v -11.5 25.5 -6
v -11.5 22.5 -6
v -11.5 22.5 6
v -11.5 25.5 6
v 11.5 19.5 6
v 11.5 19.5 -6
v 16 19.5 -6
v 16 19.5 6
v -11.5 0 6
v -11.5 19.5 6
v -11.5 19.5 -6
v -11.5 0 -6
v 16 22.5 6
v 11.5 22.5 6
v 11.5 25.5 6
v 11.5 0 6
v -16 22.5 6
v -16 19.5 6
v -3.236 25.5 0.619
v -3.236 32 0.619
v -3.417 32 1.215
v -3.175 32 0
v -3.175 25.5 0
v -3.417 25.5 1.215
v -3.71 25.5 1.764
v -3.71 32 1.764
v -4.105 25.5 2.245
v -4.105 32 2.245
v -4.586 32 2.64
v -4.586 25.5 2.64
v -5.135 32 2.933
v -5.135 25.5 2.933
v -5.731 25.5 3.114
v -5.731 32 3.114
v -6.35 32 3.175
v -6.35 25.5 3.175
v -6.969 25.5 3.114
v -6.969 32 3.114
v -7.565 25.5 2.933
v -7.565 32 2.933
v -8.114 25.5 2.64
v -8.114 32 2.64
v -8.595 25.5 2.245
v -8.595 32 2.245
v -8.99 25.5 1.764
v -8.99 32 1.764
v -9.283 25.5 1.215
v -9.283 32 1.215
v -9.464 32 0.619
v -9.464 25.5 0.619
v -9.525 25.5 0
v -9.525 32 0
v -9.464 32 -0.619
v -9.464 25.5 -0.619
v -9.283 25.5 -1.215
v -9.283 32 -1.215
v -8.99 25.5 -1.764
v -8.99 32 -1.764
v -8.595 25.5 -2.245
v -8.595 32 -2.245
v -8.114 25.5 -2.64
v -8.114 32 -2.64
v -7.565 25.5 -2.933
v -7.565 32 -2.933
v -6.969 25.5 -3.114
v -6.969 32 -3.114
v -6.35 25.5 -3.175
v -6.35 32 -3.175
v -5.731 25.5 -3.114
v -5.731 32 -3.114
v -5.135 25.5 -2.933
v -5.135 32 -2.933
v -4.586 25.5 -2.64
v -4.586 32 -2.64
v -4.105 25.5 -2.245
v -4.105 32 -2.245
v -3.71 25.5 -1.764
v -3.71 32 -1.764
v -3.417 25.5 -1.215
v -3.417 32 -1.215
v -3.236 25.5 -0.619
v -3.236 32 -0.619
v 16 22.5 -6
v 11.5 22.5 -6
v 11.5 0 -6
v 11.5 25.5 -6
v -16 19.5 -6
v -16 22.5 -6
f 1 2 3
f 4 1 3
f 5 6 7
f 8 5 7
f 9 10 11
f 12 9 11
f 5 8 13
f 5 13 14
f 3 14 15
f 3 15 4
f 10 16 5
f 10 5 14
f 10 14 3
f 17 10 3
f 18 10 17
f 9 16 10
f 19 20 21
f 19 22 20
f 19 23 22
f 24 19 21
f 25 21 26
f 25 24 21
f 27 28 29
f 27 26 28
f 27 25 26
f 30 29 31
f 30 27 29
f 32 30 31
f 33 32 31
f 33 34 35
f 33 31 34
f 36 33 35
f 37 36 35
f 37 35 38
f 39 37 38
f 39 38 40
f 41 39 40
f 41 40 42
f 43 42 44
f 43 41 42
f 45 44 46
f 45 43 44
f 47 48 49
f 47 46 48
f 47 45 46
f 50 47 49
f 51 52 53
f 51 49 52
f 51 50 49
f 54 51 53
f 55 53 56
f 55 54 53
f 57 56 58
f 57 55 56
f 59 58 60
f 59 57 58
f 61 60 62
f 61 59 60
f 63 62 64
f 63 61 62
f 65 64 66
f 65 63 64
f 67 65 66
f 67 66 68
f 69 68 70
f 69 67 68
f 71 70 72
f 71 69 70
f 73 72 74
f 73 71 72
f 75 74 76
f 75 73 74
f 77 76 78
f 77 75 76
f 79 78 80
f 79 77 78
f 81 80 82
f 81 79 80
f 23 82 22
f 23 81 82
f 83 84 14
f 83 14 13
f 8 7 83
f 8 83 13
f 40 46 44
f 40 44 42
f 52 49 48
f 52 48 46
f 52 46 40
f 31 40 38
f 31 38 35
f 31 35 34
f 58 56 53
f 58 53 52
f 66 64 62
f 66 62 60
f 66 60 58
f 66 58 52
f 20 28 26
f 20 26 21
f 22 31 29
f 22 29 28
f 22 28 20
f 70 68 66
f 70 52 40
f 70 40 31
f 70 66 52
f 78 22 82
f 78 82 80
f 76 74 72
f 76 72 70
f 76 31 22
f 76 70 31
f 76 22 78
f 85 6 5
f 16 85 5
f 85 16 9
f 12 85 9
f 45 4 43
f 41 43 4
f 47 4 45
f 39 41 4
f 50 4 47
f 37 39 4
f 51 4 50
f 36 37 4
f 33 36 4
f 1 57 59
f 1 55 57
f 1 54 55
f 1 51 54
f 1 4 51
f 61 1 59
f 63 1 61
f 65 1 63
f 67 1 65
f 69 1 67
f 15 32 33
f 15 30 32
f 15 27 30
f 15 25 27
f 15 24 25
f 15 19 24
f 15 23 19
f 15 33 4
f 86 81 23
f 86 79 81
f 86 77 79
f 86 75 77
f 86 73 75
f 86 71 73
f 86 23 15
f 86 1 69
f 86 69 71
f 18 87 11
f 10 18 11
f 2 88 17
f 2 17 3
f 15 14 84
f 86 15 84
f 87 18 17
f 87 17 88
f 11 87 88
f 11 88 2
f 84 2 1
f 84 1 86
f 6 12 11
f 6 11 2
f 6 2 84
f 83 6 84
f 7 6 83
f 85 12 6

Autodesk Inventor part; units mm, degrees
ref_plane "YZ Plane" through (0, 0, 0) normal (1, 0, 0) x (0, 1, 0)
ref_plane "XZ Plane" through (0, 0, 0) normal (0, 1, 0) x (-1, 0, 0)
ref_plane "XY Plane" through (0, 0, 0) normal (0, 0, 1) x (1, 0, 0)
sketch "Sketch1" plane through (0, 0, 0) normal (0, 1, 0) x (-1, 0, 0)
  line L0 (11.5, -6) -> (-11.5, -6)
  line L1 (-11.5, -6) -> (-11.5, 6)
  line L2 (-11.5, 6) -> (11.5, 6)
  line L3 (11.5, 6) -> (11.5, -6)
  line L4 (11.5, -6) -> (-11.5, 6) construction
  line L5 (-11.5, -6) -> (11.5, 6) construction
  point P0 (0, 0)
  dimension "d0" = 23
  dimension "d1" = 12
extrude "Extrusion1" add sketch "Sketch1" along normal blind 19.5
sketch "Sketch2" plane through (0, 19.5, 0) normal (0, 1, 0) x (1, 0, 0)
  line L0 (16, -6) -> (-16, -6)
  line L1 (-16, -6) -> (-16, 6)
  line L2 (-16, 6) -> (16, 6)
  line L3 (16, 6) -> (16, -6)
  line L4 (16, -6) -> (-16, 6) construction
  line L5 (-16, -6) -> (16, 6) construction
  point P0 (0, 0)
  dimension "d4" = 32
  dimension "d5" = 12
extrude "Extrusion2" add sketch "Sketch2" along normal blind 3
sketch "Sketch3" plane through (0, 22.5, 0) normal (0, 1, 0) x (1, 0, 0)
  line L0 (11.5, 6) -> (16, 6) projected
  line L1 (-11.5, -6) -> (11.5, -6)
  line L2 (11.5, -6) -> (11.5, 6)
  line L3 (11.5, 6) -> (-11.5, 6)
  line L4 (-11.5, 6) -> (-11.5, -6)
  line L5 (-11.5, -6) -> (11.5, 6) construction
  line L6 (11.5, -6) -> (-11.5, 6) construction
  point P0 (0, 0)
extrude "Extrusion3" add sketch "Sketch3" along normal blind 3
sketch "Sketch4" plane through (0, 25.5, 0) normal (0, 1, 0) x (1, 0, 0)
  circle A0 centre (-6.35, 0) radius 3.175
  point P0 (0, 0)
  dimension "d10" = 6.35
extrude "Extrusion4" add sketch "Sketch4" along normal blind 6.5
properties part number "sg90_servo"
